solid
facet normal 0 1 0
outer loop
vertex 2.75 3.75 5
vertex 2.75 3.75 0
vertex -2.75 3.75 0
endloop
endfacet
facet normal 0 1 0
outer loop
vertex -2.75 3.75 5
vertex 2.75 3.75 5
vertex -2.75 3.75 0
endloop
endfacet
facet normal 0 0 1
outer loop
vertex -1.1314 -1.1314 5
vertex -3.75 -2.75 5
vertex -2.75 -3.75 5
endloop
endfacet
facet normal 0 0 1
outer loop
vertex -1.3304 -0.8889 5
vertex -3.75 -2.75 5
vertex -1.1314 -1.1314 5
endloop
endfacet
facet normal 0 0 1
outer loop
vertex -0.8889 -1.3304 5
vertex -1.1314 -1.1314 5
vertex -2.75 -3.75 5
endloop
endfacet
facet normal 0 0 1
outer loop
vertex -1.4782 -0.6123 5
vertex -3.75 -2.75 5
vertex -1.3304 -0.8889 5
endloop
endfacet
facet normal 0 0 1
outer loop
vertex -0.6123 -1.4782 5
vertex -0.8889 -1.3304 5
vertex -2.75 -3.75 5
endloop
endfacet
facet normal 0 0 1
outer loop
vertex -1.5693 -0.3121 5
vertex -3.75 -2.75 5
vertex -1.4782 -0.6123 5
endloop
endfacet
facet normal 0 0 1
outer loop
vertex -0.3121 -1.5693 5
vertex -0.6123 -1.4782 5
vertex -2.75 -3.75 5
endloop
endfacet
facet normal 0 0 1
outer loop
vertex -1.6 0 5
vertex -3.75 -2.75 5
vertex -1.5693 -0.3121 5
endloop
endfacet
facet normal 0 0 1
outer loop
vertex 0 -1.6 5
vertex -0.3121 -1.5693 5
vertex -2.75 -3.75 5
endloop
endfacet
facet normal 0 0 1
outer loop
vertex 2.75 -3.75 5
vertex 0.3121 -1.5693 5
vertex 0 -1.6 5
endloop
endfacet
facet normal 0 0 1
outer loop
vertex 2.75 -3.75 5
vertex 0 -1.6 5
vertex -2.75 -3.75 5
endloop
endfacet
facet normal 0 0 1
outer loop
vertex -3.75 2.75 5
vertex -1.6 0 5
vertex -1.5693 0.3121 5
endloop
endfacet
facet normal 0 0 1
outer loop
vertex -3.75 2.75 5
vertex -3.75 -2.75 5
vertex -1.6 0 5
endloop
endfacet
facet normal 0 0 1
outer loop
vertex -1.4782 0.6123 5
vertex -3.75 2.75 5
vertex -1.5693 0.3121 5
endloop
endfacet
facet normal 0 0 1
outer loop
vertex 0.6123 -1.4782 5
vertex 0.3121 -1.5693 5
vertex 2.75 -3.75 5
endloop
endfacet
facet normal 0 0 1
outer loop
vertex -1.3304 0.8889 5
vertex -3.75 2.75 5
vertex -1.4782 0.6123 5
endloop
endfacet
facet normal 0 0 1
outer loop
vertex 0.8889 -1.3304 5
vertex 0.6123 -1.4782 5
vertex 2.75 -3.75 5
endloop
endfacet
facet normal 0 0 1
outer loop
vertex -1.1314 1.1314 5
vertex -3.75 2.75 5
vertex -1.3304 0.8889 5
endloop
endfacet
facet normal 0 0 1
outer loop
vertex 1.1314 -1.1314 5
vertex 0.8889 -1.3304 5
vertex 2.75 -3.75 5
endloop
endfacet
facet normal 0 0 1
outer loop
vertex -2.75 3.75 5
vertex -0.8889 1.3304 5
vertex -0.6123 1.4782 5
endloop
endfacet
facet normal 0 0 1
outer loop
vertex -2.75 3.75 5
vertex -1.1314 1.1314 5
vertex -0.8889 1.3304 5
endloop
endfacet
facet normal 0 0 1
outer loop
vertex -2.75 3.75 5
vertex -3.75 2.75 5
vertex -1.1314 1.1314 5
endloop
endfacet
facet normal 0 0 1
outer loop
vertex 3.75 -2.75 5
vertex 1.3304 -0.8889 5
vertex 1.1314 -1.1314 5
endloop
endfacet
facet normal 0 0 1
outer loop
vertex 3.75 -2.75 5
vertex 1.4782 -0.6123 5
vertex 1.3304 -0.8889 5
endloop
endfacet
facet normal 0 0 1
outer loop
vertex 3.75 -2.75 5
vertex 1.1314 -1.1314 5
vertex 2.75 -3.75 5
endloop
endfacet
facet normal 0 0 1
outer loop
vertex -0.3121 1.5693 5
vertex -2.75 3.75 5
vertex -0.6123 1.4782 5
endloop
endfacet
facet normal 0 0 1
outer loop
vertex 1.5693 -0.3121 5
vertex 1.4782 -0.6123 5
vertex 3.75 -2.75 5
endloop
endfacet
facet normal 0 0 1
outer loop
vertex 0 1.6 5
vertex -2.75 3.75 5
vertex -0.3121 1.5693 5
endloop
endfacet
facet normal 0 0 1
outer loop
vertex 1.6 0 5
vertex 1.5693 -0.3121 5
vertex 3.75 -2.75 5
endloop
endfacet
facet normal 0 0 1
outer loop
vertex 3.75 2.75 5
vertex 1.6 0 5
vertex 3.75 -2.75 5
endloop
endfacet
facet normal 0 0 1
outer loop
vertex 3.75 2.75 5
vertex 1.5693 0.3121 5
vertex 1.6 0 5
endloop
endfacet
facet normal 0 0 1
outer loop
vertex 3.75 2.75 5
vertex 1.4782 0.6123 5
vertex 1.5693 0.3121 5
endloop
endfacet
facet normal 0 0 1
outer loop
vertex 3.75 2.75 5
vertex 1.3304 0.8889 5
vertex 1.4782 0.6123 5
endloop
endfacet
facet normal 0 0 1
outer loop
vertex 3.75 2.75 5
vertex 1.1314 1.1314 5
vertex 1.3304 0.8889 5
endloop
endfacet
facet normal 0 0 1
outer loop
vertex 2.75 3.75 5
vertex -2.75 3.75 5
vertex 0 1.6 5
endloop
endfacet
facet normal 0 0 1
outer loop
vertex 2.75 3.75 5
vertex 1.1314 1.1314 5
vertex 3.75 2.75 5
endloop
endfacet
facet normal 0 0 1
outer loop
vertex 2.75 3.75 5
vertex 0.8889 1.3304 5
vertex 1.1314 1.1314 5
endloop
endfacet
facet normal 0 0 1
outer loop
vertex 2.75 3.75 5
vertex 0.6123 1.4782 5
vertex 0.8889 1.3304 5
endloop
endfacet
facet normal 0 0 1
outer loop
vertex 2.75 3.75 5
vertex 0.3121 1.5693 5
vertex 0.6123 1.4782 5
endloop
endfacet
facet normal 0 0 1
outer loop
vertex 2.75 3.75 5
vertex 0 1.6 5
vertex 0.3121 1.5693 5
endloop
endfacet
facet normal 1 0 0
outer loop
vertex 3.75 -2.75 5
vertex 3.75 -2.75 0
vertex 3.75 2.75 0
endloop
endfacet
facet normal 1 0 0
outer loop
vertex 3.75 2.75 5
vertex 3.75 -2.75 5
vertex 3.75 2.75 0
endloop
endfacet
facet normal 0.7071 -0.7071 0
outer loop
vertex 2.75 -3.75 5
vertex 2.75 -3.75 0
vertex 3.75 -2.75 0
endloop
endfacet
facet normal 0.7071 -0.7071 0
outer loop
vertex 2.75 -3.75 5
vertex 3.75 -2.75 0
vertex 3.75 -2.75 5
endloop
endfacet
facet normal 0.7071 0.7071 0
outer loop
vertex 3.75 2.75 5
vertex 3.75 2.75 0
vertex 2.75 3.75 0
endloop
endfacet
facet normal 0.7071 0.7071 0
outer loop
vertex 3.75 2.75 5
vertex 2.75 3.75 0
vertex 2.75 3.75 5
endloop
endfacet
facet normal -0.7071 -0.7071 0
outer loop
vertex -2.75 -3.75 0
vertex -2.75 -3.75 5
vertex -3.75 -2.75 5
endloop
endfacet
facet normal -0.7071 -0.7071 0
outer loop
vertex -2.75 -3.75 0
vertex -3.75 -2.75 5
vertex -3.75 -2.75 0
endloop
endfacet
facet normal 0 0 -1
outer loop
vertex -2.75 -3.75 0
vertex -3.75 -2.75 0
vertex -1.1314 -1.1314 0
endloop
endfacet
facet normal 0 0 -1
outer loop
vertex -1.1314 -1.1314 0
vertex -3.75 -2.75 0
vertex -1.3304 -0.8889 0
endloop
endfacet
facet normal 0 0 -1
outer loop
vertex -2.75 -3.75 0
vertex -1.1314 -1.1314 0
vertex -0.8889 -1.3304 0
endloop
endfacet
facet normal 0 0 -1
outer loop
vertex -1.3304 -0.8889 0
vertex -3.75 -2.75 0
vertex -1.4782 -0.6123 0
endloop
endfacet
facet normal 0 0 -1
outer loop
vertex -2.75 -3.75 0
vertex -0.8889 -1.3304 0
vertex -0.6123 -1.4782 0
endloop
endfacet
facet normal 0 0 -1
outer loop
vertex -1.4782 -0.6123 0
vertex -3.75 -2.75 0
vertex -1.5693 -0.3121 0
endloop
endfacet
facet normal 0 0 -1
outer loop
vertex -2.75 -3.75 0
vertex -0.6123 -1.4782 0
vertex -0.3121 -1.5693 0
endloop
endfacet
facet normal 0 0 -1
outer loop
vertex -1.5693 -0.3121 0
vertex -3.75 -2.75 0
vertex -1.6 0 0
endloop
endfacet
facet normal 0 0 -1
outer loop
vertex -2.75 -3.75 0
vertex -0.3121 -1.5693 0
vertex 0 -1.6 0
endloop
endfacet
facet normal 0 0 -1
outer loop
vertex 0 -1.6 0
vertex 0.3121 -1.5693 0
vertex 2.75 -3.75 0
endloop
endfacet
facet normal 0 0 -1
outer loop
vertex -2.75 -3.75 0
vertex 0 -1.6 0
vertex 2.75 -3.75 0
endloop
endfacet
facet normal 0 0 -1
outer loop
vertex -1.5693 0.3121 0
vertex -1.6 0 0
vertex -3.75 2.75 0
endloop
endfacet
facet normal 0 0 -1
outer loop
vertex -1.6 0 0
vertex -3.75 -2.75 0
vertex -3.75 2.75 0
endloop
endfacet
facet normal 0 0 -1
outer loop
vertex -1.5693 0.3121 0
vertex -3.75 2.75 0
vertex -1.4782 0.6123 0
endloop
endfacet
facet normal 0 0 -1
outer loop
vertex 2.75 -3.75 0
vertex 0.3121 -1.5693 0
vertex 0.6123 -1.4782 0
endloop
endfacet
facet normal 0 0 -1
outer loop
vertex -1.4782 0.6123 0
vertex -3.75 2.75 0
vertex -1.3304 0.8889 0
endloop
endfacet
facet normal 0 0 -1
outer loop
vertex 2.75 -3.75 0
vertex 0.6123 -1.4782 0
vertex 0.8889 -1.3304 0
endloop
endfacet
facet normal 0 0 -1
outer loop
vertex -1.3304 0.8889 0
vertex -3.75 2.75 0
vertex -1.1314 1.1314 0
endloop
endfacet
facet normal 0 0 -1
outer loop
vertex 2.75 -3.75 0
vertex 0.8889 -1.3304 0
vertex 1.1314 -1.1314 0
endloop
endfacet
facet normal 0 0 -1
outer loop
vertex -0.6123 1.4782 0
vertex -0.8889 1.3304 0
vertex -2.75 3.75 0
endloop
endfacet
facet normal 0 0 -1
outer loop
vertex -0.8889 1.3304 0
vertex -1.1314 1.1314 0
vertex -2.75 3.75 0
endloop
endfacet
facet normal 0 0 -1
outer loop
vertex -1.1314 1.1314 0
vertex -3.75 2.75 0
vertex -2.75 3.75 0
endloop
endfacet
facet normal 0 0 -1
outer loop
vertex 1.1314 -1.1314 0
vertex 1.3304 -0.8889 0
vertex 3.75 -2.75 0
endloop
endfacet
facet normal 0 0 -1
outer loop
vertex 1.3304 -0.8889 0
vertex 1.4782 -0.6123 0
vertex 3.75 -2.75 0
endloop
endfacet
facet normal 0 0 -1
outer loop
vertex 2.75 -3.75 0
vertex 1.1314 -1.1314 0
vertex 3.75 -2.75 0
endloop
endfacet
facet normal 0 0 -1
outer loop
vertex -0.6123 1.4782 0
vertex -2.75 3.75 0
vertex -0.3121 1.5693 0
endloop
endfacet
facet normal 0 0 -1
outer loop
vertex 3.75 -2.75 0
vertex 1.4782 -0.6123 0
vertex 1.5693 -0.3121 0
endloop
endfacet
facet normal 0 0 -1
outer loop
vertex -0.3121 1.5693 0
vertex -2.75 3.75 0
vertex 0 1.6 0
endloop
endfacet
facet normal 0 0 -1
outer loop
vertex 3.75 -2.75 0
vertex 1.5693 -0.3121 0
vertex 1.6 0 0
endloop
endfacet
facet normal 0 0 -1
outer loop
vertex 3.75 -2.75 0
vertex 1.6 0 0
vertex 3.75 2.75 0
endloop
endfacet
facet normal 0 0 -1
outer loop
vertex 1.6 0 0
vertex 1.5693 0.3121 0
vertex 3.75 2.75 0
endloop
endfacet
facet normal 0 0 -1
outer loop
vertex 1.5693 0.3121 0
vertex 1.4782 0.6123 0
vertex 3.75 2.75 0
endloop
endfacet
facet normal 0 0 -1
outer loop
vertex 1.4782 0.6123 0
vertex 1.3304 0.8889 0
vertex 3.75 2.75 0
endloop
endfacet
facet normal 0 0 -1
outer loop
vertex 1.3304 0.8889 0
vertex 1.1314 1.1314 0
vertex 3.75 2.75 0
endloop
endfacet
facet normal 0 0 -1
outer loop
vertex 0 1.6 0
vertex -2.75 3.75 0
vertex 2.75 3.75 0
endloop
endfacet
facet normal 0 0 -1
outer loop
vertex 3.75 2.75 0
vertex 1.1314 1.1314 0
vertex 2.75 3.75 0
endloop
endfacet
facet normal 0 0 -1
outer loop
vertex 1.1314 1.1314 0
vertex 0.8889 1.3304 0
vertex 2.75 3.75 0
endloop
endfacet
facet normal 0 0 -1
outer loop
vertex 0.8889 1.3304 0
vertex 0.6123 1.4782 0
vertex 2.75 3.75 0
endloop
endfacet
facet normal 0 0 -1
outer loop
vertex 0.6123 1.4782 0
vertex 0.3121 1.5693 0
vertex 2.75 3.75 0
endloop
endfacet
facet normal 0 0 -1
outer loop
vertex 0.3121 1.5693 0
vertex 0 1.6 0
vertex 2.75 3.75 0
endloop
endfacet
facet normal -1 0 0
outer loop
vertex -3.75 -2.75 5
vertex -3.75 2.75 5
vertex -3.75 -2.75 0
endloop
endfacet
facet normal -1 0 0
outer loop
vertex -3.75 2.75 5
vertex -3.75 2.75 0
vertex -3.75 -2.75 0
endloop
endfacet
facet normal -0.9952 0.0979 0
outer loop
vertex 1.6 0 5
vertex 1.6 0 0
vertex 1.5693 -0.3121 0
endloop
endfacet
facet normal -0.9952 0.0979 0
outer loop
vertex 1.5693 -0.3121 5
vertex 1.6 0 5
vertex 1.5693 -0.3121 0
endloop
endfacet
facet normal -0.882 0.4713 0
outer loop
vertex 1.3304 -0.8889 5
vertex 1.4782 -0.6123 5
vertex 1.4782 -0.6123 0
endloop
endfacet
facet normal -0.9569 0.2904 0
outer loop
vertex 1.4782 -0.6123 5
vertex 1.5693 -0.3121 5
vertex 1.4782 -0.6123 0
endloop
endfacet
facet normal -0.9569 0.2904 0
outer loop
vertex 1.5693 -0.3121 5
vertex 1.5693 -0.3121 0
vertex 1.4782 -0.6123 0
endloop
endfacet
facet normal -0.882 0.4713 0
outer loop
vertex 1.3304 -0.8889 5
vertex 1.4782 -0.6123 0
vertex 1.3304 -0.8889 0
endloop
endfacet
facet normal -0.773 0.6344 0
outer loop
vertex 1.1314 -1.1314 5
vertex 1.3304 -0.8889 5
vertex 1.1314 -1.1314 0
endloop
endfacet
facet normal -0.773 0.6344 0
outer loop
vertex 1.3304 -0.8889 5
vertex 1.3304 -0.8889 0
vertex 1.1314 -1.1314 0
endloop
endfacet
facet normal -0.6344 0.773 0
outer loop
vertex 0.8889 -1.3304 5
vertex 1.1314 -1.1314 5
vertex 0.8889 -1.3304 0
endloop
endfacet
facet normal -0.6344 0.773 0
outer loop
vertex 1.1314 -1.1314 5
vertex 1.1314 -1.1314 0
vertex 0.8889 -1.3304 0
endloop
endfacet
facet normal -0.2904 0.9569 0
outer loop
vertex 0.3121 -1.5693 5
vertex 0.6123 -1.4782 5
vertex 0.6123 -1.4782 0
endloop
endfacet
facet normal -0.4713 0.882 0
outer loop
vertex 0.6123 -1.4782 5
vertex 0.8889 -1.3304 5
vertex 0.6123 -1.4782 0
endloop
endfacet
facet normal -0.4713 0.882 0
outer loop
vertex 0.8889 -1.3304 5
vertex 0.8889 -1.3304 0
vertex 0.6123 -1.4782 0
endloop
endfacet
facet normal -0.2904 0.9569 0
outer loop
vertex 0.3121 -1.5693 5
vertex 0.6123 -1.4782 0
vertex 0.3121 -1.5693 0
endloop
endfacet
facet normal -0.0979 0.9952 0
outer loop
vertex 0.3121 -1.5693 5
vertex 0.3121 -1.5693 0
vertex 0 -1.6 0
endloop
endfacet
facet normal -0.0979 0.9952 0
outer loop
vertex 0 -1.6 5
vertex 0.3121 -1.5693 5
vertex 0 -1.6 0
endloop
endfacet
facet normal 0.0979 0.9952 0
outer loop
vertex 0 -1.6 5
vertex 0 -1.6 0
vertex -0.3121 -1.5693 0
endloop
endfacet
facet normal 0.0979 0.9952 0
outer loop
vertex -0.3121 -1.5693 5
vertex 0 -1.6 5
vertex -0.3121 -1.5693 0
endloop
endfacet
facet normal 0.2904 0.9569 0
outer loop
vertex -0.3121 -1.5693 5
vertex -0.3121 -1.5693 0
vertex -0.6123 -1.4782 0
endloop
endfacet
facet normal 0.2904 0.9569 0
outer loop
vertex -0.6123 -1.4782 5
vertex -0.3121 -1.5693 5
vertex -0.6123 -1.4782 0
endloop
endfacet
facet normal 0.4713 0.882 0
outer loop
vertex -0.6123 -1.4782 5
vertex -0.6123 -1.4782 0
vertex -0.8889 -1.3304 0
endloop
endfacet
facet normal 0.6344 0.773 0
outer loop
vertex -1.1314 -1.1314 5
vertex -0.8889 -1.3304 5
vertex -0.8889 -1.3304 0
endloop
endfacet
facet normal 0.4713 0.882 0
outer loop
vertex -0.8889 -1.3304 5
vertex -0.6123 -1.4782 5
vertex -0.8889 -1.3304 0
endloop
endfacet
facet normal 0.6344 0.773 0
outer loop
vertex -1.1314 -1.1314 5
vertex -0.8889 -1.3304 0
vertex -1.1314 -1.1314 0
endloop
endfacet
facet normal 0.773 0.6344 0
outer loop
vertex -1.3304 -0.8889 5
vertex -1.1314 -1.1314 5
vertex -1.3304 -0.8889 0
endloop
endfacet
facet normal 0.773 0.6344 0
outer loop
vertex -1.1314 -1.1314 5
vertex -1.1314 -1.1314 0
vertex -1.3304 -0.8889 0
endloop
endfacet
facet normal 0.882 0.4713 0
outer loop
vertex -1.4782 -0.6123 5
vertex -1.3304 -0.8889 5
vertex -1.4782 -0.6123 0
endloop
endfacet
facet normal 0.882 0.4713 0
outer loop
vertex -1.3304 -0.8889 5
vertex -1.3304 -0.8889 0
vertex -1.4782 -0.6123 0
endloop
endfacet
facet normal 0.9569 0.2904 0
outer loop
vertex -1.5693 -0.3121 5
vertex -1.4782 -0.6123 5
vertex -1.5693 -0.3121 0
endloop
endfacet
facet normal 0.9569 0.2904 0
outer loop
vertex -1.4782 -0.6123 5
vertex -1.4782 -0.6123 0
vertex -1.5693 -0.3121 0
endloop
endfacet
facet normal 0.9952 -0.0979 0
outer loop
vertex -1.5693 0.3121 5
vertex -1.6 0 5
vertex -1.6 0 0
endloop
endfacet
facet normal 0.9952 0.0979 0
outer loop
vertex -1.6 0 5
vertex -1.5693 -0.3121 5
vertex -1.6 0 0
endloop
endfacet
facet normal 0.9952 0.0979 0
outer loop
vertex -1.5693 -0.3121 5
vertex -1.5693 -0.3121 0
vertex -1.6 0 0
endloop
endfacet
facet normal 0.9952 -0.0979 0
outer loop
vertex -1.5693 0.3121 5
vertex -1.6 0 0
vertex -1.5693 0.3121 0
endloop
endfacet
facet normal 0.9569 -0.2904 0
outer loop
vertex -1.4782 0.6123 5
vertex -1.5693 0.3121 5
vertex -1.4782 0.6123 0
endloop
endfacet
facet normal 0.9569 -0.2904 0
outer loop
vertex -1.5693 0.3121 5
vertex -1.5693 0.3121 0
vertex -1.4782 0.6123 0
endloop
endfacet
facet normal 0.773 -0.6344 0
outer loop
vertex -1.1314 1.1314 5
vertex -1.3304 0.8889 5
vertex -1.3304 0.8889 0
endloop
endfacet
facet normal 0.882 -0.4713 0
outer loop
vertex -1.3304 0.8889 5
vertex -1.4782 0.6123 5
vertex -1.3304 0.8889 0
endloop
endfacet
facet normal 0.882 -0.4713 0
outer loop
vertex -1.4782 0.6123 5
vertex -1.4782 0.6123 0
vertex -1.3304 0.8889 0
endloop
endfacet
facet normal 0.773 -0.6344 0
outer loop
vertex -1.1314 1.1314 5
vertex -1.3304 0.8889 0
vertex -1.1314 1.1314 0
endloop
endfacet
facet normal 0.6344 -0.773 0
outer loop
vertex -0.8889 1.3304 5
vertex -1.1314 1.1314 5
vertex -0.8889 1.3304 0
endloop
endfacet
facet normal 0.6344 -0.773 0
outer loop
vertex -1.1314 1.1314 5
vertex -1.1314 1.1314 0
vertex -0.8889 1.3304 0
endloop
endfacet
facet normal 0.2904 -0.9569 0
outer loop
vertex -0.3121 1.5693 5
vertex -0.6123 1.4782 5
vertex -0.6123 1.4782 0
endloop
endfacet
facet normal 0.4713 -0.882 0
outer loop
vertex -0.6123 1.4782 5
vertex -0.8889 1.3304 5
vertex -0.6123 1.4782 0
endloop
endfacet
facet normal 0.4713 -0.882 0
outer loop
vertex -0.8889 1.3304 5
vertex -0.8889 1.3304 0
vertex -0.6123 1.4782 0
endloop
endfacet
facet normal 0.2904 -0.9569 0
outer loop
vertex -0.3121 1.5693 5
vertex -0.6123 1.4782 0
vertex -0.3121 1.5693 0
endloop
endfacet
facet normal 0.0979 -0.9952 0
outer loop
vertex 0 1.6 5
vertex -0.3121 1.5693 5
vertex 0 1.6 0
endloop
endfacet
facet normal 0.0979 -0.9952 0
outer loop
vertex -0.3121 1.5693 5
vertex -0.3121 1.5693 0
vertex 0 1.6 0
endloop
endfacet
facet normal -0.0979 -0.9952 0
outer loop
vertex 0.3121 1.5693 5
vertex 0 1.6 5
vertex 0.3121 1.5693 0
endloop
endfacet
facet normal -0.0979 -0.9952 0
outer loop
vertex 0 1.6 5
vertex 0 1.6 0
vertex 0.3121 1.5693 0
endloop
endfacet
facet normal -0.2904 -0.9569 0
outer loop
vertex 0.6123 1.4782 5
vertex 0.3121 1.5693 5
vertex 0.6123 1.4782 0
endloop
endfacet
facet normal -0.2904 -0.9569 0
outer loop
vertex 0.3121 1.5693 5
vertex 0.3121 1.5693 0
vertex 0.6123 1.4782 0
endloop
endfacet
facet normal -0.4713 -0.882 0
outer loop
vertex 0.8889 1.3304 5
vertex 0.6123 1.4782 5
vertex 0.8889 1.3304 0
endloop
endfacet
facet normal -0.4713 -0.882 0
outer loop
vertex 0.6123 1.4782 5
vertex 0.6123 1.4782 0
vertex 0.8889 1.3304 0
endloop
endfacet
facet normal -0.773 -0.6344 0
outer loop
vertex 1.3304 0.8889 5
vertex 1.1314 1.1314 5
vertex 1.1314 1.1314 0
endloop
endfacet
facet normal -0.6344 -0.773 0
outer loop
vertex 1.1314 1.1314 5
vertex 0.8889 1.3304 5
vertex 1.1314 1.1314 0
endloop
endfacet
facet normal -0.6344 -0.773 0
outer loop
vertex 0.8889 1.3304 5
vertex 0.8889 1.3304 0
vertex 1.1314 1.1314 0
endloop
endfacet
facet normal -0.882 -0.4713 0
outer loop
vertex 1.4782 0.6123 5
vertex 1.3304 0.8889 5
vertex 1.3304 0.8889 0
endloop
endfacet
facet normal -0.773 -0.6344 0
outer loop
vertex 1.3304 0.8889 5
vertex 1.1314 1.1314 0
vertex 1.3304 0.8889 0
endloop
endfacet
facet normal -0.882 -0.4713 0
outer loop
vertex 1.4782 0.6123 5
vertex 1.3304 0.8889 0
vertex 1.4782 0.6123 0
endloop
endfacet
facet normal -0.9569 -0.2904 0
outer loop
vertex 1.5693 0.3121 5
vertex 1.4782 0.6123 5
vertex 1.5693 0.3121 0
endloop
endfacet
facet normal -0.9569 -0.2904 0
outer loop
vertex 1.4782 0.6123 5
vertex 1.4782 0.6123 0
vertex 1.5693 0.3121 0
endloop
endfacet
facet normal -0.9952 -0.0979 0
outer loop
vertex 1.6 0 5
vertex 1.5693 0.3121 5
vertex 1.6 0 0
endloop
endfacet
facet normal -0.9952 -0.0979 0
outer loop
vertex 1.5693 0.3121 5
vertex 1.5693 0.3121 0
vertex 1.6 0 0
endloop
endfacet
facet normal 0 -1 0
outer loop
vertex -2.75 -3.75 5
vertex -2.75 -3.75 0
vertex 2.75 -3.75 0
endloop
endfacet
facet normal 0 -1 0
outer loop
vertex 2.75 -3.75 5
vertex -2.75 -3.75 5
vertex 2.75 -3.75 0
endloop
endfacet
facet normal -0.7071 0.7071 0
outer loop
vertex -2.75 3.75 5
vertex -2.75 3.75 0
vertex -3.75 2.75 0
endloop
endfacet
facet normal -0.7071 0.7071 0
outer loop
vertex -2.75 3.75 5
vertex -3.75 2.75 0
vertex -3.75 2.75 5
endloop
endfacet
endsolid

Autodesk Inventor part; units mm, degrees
ref_plane "YZ Plane" through (0, 0, 0) normal (1, 0, 0) x (0, 1, 0)
ref_plane "XZ Plane" through (0, 0, 0) normal (0, 1, 0) x (-1, 0, 0)
ref_plane "XY Plane" through (0, 0, 0) normal (0, 0, 1) x (1, 0, 0)
sketch "Sketch1" plane through (0, 0, 0) normal (0, 0, 1) x (1, 0, 0)
  circle A0 centre (0, 0) radius 1.6
  line L0 (-3.75, -3.75) -> (3.75, -3.75)
  line L1 (3.75, -3.75) -> (3.75, 3.75)
  line L2 (3.75, 3.75) -> (-3.75, 3.75)
  line L3 (-3.75, 3.75) -> (-3.75, -3.75)
  point P0 (3.75, 0)
  point P1 (0, 3.75)
  dimension "d0" = 3.2
  dimension "d1" = 7.5
  dimension "d2" = 7.5
extrude "Extrusion1" add sketch "Sketch1" along normal blind 5
chamfer "Chamfer1" distance 1 angle 45 4 edges at (3.75, -3.75, 2.5) (-3.75, -3.75, 2.5) (-3.75, 3.75, 2.5) (3.75, 3.75, 2.5)
properties part number "EndEffector_holder_Touch"
